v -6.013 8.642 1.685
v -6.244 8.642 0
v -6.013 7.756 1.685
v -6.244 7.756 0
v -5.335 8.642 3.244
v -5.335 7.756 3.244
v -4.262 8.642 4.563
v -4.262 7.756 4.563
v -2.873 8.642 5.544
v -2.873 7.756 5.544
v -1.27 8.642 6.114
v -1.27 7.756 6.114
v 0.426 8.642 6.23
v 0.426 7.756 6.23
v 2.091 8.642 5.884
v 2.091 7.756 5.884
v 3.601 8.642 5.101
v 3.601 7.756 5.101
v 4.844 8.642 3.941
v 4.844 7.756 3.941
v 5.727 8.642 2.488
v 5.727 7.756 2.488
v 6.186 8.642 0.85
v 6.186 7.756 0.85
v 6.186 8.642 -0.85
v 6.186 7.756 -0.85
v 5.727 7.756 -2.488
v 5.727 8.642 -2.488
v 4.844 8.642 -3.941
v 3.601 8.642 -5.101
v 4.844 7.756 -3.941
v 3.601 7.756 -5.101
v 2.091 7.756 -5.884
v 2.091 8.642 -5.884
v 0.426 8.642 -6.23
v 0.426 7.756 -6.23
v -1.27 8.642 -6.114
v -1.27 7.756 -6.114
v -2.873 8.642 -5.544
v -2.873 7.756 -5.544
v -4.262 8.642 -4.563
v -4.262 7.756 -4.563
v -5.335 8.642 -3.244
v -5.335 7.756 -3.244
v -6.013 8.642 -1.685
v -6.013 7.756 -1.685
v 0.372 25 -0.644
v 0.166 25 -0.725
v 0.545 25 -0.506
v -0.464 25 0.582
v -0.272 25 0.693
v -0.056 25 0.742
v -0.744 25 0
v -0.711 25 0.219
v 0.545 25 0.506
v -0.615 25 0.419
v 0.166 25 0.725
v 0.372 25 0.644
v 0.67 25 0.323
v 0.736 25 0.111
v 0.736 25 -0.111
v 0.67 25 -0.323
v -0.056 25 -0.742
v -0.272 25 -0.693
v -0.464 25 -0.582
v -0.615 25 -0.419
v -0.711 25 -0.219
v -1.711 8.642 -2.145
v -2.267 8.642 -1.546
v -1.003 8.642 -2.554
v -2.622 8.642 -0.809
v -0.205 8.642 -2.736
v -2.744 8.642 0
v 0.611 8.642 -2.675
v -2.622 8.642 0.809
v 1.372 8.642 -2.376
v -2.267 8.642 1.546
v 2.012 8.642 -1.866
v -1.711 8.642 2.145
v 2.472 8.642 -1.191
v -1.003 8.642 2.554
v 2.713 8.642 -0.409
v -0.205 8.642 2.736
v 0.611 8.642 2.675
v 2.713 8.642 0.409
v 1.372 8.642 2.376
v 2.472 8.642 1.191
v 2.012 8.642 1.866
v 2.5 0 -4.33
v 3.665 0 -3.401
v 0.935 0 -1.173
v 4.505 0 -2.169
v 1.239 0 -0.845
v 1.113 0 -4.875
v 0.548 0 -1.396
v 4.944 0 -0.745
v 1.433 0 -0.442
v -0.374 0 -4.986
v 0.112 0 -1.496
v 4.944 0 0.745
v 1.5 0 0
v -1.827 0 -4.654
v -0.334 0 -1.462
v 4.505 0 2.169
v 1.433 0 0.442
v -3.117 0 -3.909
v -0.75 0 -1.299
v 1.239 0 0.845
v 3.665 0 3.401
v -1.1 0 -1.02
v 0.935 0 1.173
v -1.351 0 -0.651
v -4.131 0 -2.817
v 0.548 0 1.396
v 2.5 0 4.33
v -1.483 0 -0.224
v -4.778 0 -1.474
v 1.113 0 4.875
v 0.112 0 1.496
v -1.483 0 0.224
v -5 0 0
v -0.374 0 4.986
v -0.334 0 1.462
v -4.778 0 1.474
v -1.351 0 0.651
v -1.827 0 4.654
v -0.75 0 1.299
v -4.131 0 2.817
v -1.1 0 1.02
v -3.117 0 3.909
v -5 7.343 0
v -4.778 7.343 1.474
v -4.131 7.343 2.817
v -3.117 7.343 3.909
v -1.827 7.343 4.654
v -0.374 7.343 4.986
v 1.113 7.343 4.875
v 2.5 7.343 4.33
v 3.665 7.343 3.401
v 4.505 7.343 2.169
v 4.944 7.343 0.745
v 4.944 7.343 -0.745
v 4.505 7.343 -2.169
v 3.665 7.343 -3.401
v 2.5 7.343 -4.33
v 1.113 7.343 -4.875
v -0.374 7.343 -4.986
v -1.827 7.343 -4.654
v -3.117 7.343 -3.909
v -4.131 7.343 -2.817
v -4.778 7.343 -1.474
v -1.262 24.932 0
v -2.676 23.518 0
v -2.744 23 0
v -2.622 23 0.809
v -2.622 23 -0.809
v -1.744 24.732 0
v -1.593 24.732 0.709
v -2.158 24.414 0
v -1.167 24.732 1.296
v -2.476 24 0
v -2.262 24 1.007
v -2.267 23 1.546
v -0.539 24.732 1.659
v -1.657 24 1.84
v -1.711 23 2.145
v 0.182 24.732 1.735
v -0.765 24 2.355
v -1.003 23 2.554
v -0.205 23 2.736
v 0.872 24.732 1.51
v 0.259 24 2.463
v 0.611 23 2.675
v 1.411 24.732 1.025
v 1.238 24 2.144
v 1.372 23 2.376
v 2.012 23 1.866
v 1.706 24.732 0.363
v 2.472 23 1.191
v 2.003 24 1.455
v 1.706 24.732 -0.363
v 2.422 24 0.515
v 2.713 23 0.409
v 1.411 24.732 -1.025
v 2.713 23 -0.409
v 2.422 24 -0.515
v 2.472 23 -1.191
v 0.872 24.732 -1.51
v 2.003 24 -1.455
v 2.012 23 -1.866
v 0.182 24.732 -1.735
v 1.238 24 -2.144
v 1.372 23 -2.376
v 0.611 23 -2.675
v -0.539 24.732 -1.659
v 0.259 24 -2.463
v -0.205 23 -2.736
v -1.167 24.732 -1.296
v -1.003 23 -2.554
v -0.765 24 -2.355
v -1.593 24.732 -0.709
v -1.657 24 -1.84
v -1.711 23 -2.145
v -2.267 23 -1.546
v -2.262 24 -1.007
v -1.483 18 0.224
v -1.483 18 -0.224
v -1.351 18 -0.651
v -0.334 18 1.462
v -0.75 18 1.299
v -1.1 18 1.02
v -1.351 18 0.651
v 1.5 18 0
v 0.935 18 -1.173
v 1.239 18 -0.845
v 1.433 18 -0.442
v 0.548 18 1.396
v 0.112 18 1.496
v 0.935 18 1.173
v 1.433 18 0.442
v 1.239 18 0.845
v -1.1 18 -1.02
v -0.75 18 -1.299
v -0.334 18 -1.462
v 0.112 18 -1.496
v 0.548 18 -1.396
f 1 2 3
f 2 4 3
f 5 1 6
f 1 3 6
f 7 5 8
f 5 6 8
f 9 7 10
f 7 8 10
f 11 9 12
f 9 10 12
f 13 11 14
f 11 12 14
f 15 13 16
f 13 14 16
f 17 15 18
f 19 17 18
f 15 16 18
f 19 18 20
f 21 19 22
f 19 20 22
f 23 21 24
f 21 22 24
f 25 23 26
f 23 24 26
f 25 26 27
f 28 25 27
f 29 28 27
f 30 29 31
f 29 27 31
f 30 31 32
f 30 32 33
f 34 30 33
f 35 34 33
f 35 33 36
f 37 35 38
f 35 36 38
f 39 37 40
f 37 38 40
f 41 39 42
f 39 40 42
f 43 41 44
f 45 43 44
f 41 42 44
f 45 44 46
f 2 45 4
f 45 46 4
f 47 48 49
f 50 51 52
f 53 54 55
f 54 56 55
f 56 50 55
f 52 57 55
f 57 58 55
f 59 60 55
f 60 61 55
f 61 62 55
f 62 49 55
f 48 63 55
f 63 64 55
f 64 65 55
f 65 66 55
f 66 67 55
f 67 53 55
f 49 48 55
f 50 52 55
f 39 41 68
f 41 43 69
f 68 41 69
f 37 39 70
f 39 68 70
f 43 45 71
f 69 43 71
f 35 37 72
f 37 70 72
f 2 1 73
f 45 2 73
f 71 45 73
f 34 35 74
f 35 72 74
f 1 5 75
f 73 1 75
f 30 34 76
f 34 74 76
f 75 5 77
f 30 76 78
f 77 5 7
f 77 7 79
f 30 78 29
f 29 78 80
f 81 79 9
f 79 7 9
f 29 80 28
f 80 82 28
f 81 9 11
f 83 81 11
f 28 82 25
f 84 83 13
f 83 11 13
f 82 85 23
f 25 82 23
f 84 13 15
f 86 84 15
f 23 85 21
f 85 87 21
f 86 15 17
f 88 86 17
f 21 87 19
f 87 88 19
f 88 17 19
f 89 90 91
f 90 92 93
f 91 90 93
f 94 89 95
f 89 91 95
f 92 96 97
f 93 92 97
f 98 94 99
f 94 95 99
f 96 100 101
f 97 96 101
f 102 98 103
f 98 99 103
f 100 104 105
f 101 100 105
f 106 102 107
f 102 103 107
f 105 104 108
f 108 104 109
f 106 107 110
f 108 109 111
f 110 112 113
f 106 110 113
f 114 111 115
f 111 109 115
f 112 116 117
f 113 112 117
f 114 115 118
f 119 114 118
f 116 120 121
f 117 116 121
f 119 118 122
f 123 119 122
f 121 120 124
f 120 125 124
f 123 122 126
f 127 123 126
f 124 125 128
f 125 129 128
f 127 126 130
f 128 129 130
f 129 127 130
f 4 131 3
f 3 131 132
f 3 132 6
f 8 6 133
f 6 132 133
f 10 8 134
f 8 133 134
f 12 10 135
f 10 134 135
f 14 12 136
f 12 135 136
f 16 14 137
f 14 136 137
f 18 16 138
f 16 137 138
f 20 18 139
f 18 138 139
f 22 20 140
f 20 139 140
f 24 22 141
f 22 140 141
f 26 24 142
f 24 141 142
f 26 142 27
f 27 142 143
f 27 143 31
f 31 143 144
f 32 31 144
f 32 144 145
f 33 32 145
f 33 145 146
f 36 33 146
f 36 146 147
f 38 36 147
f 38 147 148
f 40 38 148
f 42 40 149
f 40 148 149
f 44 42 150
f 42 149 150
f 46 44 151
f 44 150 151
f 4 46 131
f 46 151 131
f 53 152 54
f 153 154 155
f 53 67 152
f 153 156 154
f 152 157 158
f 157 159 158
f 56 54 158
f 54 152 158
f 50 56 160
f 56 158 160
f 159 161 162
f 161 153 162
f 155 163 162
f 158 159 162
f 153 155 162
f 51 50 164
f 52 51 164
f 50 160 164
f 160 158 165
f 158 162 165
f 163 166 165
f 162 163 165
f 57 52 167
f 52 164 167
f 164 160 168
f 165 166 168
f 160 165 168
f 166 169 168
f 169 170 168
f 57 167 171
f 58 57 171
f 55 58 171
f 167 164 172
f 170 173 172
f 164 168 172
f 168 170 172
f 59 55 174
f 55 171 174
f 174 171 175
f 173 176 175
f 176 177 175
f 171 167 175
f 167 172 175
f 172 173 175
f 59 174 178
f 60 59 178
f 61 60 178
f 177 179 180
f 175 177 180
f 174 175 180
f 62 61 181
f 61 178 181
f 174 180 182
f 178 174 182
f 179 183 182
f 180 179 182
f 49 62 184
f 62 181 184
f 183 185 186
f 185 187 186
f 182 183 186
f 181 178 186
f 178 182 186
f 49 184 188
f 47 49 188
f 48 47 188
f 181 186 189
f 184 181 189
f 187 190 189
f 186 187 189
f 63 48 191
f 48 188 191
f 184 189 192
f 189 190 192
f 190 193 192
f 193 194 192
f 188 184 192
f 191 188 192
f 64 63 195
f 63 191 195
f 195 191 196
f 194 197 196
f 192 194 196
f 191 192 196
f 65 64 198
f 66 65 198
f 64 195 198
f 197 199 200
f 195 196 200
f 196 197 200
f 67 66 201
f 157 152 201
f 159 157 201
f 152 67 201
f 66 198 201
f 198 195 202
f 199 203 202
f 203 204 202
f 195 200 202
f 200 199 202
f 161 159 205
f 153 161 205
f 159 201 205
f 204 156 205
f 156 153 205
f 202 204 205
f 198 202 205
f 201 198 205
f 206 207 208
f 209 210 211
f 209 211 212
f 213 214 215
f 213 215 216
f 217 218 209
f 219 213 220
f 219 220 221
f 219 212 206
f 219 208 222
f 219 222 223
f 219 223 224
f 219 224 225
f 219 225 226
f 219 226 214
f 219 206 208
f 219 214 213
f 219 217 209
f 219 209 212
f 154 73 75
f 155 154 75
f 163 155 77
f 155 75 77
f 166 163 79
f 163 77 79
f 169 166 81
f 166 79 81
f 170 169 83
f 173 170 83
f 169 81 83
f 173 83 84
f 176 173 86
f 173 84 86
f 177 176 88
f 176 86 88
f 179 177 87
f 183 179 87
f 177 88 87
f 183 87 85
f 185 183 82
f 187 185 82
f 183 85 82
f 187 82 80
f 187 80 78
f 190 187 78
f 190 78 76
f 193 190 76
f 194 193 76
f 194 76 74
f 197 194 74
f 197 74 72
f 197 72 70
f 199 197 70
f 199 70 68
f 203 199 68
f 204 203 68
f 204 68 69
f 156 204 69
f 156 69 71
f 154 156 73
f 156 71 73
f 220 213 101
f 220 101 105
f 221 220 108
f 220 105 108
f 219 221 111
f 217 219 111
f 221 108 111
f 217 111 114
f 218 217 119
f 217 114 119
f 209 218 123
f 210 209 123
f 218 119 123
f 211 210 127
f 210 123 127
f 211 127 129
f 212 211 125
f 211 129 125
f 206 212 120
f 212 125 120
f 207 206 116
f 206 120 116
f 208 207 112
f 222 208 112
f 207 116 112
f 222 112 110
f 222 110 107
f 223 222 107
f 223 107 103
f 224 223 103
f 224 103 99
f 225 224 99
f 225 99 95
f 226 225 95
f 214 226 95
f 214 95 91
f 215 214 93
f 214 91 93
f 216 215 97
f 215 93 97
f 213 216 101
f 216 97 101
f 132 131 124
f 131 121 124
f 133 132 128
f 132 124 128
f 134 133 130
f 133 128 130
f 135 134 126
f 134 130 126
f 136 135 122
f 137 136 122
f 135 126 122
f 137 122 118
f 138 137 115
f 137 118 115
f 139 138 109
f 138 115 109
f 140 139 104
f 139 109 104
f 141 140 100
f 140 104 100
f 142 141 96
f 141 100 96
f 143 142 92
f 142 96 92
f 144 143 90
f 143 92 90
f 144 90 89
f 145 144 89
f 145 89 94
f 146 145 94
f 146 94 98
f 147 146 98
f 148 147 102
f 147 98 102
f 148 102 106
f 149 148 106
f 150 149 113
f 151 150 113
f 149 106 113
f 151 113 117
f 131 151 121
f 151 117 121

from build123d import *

# Parameters (mm, degrees)
FILLET1_R          = 2
SKETCH2_R          = 1.5
CUT_EXTRUDE1_DEPTH = 18


with BuildPart() as part:
    # Sketch1 → Revolve1 (revolve)
    with BuildSketch(Plane.XY):
        Polygon((0, 0), (0, 25), (-2.744112853, 25), (-2.744112853, 8.642091449), (-6.244112853, 8.642091449), (-6.244112853, 7.755870593), (-5, 7.343117412), (-5, 0), align=None)
    revolve(axis=Axis((0, 0, 0), (0, 1, 0)))

    # Fillet1
    fillet1_edges = [part.edges().sort_by_distance(p)[0] for p in [
        (2.744112853, 25, 0),
    ]]
    fillet(fillet1_edges, radius=FILLET1_R)

    # Sketch2 → Cut-Extrude1 (cut)
    with BuildSketch(Plane.XZ):
        Circle(SKETCH2_R)
    extrude(amount=-CUT_EXTRUDE1_DEPTH, mode=Mode.SUBTRACT)


solid = part.part
